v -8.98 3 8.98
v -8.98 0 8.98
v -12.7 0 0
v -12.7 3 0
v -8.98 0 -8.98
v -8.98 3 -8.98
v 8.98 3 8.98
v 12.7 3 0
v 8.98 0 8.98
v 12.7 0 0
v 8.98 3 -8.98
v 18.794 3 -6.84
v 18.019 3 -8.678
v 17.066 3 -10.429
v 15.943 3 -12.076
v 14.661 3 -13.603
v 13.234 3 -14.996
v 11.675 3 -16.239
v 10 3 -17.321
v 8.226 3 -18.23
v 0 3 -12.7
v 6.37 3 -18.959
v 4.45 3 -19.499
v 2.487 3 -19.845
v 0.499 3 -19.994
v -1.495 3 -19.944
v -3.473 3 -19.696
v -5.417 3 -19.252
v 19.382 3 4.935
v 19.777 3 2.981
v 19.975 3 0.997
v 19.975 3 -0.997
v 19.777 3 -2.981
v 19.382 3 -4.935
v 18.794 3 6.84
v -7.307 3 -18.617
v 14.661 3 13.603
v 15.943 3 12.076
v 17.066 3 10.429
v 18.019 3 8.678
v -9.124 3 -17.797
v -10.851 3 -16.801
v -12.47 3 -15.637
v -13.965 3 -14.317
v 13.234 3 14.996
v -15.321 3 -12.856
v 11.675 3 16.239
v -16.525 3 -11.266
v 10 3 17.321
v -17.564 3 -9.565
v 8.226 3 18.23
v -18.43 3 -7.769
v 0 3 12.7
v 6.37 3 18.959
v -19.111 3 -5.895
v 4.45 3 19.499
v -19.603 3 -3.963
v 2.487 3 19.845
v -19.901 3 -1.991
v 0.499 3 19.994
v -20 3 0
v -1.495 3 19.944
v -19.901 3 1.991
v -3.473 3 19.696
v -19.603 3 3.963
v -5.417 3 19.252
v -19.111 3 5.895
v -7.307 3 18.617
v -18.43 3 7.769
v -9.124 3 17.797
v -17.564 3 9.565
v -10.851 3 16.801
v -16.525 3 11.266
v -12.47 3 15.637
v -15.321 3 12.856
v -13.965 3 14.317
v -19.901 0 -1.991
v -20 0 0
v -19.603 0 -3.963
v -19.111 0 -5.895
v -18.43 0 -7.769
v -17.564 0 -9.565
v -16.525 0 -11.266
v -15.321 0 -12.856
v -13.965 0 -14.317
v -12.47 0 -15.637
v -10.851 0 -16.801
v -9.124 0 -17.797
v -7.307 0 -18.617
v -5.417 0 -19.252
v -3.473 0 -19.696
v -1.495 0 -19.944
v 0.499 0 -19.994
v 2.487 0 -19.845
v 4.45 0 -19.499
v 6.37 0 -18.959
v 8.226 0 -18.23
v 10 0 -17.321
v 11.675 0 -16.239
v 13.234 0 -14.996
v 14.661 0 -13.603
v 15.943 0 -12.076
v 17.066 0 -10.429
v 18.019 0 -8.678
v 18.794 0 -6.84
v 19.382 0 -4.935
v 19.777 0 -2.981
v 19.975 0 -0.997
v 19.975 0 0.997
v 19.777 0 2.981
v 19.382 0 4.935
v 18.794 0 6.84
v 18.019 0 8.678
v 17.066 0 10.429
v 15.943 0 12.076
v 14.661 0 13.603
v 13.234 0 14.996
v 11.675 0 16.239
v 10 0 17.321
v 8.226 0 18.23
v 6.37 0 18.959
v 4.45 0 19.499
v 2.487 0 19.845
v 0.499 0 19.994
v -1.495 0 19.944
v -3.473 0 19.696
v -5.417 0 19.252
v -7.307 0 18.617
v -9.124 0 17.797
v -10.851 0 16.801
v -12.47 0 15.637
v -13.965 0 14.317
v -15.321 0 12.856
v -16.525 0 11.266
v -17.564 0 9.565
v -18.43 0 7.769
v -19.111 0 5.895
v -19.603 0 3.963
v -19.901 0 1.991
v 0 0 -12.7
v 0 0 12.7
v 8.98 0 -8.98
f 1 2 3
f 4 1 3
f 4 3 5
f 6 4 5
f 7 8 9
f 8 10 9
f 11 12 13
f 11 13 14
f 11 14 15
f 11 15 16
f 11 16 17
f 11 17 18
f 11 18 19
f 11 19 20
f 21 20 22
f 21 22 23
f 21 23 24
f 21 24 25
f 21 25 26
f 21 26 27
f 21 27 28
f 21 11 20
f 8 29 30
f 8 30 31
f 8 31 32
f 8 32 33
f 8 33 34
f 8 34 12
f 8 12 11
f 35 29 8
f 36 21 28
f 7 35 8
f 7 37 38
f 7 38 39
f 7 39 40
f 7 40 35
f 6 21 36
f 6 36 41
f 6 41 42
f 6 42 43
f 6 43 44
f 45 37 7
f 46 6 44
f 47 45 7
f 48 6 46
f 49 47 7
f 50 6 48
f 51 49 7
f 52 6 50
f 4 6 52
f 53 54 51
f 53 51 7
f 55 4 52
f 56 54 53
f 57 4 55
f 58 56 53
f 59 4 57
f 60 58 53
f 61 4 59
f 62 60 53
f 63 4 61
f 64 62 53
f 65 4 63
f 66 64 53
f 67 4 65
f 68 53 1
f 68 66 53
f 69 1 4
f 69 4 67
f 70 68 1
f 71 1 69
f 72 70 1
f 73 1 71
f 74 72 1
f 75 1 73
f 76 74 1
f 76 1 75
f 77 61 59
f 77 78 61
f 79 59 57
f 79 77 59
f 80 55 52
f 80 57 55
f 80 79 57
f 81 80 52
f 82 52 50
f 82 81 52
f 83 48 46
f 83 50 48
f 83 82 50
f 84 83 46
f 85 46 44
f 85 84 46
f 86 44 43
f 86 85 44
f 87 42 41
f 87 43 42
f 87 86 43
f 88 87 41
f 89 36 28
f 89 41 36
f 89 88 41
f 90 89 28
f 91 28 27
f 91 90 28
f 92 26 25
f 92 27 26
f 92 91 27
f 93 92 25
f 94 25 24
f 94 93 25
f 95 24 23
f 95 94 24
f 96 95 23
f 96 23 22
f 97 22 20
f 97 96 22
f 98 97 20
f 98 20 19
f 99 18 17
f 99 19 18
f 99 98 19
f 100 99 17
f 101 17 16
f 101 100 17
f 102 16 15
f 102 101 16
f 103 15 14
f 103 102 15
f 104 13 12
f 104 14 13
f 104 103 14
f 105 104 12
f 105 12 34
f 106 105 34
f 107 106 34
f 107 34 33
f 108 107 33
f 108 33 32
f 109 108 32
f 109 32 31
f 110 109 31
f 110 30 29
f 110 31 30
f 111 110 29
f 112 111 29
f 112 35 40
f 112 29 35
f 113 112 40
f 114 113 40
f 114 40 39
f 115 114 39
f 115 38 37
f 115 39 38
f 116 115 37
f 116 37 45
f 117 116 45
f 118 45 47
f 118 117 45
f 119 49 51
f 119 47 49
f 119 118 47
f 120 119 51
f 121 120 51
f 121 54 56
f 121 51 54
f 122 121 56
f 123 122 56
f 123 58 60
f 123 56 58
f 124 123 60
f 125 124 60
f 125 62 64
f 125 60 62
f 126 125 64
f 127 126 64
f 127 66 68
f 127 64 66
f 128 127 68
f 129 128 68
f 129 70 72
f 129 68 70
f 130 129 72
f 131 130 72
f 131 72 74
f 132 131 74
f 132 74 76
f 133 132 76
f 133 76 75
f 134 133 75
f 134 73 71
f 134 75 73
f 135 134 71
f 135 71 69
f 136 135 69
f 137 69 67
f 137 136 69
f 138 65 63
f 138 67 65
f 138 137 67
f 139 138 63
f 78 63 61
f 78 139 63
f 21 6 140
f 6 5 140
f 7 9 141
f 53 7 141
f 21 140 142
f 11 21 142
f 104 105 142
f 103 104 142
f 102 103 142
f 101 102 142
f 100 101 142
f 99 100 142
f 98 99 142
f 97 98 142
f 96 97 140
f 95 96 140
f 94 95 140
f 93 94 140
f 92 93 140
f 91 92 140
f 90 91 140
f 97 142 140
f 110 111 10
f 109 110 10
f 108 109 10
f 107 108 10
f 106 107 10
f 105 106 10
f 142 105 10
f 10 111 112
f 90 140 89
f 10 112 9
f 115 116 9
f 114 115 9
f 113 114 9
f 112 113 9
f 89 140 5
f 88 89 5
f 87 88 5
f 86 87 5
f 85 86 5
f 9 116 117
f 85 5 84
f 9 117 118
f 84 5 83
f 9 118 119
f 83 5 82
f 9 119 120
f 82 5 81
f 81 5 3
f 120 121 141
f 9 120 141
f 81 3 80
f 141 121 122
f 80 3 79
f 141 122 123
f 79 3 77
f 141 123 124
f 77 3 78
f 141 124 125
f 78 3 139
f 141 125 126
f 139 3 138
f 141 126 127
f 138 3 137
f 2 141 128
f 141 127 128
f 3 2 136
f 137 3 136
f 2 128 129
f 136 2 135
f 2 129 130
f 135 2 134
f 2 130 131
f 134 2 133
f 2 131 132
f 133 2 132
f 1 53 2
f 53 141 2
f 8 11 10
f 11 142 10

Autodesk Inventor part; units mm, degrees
ref_plane "YZ Plane" through (0, 0, 0) normal (1, 0, 0) x (0, 1, 0)
ref_plane "XZ Plane" through (0, 0, 0) normal (0, 1, 0) x (-1, 0, 0)
ref_plane "XY Plane" through (0, 0, 0) normal (0, 0, 1) x (1, 0, 0)
sketch "Boceto1" plane through (0, 0, 0) normal (0, 1, 0) x (-1, 0, 0)
  circle A0 centre (0, 0) radius 12.7 construction
  circle A1 centre (0, 0) radius 20
  line L0 (0, -12.7) -> (-8.9803, -8.9803)
  line L1 (-8.9803, -8.9803) -> (-12.7, 0)
  line L2 (-12.7, 0) -> (-8.9803, 8.9803)
  line L3 (-8.9803, 8.9803) -> (0, 12.7)
  line L4 (0, 12.7) -> (8.9803, 8.9803)
  line L5 (8.9803, 8.9803) -> (12.7, 0)
  line L6 (12.7, 0) -> (8.9803, -8.9803)
  line L7 (8.9803, -8.9803) -> (0, -12.7)
  point P0 (0, 12.7)
  dimension "d0" = 25.4
  dimension "d1" = 40
extrude "Extrusión1" add sketch "Boceto1" along normal blind 3
properties part number "espaciador"
